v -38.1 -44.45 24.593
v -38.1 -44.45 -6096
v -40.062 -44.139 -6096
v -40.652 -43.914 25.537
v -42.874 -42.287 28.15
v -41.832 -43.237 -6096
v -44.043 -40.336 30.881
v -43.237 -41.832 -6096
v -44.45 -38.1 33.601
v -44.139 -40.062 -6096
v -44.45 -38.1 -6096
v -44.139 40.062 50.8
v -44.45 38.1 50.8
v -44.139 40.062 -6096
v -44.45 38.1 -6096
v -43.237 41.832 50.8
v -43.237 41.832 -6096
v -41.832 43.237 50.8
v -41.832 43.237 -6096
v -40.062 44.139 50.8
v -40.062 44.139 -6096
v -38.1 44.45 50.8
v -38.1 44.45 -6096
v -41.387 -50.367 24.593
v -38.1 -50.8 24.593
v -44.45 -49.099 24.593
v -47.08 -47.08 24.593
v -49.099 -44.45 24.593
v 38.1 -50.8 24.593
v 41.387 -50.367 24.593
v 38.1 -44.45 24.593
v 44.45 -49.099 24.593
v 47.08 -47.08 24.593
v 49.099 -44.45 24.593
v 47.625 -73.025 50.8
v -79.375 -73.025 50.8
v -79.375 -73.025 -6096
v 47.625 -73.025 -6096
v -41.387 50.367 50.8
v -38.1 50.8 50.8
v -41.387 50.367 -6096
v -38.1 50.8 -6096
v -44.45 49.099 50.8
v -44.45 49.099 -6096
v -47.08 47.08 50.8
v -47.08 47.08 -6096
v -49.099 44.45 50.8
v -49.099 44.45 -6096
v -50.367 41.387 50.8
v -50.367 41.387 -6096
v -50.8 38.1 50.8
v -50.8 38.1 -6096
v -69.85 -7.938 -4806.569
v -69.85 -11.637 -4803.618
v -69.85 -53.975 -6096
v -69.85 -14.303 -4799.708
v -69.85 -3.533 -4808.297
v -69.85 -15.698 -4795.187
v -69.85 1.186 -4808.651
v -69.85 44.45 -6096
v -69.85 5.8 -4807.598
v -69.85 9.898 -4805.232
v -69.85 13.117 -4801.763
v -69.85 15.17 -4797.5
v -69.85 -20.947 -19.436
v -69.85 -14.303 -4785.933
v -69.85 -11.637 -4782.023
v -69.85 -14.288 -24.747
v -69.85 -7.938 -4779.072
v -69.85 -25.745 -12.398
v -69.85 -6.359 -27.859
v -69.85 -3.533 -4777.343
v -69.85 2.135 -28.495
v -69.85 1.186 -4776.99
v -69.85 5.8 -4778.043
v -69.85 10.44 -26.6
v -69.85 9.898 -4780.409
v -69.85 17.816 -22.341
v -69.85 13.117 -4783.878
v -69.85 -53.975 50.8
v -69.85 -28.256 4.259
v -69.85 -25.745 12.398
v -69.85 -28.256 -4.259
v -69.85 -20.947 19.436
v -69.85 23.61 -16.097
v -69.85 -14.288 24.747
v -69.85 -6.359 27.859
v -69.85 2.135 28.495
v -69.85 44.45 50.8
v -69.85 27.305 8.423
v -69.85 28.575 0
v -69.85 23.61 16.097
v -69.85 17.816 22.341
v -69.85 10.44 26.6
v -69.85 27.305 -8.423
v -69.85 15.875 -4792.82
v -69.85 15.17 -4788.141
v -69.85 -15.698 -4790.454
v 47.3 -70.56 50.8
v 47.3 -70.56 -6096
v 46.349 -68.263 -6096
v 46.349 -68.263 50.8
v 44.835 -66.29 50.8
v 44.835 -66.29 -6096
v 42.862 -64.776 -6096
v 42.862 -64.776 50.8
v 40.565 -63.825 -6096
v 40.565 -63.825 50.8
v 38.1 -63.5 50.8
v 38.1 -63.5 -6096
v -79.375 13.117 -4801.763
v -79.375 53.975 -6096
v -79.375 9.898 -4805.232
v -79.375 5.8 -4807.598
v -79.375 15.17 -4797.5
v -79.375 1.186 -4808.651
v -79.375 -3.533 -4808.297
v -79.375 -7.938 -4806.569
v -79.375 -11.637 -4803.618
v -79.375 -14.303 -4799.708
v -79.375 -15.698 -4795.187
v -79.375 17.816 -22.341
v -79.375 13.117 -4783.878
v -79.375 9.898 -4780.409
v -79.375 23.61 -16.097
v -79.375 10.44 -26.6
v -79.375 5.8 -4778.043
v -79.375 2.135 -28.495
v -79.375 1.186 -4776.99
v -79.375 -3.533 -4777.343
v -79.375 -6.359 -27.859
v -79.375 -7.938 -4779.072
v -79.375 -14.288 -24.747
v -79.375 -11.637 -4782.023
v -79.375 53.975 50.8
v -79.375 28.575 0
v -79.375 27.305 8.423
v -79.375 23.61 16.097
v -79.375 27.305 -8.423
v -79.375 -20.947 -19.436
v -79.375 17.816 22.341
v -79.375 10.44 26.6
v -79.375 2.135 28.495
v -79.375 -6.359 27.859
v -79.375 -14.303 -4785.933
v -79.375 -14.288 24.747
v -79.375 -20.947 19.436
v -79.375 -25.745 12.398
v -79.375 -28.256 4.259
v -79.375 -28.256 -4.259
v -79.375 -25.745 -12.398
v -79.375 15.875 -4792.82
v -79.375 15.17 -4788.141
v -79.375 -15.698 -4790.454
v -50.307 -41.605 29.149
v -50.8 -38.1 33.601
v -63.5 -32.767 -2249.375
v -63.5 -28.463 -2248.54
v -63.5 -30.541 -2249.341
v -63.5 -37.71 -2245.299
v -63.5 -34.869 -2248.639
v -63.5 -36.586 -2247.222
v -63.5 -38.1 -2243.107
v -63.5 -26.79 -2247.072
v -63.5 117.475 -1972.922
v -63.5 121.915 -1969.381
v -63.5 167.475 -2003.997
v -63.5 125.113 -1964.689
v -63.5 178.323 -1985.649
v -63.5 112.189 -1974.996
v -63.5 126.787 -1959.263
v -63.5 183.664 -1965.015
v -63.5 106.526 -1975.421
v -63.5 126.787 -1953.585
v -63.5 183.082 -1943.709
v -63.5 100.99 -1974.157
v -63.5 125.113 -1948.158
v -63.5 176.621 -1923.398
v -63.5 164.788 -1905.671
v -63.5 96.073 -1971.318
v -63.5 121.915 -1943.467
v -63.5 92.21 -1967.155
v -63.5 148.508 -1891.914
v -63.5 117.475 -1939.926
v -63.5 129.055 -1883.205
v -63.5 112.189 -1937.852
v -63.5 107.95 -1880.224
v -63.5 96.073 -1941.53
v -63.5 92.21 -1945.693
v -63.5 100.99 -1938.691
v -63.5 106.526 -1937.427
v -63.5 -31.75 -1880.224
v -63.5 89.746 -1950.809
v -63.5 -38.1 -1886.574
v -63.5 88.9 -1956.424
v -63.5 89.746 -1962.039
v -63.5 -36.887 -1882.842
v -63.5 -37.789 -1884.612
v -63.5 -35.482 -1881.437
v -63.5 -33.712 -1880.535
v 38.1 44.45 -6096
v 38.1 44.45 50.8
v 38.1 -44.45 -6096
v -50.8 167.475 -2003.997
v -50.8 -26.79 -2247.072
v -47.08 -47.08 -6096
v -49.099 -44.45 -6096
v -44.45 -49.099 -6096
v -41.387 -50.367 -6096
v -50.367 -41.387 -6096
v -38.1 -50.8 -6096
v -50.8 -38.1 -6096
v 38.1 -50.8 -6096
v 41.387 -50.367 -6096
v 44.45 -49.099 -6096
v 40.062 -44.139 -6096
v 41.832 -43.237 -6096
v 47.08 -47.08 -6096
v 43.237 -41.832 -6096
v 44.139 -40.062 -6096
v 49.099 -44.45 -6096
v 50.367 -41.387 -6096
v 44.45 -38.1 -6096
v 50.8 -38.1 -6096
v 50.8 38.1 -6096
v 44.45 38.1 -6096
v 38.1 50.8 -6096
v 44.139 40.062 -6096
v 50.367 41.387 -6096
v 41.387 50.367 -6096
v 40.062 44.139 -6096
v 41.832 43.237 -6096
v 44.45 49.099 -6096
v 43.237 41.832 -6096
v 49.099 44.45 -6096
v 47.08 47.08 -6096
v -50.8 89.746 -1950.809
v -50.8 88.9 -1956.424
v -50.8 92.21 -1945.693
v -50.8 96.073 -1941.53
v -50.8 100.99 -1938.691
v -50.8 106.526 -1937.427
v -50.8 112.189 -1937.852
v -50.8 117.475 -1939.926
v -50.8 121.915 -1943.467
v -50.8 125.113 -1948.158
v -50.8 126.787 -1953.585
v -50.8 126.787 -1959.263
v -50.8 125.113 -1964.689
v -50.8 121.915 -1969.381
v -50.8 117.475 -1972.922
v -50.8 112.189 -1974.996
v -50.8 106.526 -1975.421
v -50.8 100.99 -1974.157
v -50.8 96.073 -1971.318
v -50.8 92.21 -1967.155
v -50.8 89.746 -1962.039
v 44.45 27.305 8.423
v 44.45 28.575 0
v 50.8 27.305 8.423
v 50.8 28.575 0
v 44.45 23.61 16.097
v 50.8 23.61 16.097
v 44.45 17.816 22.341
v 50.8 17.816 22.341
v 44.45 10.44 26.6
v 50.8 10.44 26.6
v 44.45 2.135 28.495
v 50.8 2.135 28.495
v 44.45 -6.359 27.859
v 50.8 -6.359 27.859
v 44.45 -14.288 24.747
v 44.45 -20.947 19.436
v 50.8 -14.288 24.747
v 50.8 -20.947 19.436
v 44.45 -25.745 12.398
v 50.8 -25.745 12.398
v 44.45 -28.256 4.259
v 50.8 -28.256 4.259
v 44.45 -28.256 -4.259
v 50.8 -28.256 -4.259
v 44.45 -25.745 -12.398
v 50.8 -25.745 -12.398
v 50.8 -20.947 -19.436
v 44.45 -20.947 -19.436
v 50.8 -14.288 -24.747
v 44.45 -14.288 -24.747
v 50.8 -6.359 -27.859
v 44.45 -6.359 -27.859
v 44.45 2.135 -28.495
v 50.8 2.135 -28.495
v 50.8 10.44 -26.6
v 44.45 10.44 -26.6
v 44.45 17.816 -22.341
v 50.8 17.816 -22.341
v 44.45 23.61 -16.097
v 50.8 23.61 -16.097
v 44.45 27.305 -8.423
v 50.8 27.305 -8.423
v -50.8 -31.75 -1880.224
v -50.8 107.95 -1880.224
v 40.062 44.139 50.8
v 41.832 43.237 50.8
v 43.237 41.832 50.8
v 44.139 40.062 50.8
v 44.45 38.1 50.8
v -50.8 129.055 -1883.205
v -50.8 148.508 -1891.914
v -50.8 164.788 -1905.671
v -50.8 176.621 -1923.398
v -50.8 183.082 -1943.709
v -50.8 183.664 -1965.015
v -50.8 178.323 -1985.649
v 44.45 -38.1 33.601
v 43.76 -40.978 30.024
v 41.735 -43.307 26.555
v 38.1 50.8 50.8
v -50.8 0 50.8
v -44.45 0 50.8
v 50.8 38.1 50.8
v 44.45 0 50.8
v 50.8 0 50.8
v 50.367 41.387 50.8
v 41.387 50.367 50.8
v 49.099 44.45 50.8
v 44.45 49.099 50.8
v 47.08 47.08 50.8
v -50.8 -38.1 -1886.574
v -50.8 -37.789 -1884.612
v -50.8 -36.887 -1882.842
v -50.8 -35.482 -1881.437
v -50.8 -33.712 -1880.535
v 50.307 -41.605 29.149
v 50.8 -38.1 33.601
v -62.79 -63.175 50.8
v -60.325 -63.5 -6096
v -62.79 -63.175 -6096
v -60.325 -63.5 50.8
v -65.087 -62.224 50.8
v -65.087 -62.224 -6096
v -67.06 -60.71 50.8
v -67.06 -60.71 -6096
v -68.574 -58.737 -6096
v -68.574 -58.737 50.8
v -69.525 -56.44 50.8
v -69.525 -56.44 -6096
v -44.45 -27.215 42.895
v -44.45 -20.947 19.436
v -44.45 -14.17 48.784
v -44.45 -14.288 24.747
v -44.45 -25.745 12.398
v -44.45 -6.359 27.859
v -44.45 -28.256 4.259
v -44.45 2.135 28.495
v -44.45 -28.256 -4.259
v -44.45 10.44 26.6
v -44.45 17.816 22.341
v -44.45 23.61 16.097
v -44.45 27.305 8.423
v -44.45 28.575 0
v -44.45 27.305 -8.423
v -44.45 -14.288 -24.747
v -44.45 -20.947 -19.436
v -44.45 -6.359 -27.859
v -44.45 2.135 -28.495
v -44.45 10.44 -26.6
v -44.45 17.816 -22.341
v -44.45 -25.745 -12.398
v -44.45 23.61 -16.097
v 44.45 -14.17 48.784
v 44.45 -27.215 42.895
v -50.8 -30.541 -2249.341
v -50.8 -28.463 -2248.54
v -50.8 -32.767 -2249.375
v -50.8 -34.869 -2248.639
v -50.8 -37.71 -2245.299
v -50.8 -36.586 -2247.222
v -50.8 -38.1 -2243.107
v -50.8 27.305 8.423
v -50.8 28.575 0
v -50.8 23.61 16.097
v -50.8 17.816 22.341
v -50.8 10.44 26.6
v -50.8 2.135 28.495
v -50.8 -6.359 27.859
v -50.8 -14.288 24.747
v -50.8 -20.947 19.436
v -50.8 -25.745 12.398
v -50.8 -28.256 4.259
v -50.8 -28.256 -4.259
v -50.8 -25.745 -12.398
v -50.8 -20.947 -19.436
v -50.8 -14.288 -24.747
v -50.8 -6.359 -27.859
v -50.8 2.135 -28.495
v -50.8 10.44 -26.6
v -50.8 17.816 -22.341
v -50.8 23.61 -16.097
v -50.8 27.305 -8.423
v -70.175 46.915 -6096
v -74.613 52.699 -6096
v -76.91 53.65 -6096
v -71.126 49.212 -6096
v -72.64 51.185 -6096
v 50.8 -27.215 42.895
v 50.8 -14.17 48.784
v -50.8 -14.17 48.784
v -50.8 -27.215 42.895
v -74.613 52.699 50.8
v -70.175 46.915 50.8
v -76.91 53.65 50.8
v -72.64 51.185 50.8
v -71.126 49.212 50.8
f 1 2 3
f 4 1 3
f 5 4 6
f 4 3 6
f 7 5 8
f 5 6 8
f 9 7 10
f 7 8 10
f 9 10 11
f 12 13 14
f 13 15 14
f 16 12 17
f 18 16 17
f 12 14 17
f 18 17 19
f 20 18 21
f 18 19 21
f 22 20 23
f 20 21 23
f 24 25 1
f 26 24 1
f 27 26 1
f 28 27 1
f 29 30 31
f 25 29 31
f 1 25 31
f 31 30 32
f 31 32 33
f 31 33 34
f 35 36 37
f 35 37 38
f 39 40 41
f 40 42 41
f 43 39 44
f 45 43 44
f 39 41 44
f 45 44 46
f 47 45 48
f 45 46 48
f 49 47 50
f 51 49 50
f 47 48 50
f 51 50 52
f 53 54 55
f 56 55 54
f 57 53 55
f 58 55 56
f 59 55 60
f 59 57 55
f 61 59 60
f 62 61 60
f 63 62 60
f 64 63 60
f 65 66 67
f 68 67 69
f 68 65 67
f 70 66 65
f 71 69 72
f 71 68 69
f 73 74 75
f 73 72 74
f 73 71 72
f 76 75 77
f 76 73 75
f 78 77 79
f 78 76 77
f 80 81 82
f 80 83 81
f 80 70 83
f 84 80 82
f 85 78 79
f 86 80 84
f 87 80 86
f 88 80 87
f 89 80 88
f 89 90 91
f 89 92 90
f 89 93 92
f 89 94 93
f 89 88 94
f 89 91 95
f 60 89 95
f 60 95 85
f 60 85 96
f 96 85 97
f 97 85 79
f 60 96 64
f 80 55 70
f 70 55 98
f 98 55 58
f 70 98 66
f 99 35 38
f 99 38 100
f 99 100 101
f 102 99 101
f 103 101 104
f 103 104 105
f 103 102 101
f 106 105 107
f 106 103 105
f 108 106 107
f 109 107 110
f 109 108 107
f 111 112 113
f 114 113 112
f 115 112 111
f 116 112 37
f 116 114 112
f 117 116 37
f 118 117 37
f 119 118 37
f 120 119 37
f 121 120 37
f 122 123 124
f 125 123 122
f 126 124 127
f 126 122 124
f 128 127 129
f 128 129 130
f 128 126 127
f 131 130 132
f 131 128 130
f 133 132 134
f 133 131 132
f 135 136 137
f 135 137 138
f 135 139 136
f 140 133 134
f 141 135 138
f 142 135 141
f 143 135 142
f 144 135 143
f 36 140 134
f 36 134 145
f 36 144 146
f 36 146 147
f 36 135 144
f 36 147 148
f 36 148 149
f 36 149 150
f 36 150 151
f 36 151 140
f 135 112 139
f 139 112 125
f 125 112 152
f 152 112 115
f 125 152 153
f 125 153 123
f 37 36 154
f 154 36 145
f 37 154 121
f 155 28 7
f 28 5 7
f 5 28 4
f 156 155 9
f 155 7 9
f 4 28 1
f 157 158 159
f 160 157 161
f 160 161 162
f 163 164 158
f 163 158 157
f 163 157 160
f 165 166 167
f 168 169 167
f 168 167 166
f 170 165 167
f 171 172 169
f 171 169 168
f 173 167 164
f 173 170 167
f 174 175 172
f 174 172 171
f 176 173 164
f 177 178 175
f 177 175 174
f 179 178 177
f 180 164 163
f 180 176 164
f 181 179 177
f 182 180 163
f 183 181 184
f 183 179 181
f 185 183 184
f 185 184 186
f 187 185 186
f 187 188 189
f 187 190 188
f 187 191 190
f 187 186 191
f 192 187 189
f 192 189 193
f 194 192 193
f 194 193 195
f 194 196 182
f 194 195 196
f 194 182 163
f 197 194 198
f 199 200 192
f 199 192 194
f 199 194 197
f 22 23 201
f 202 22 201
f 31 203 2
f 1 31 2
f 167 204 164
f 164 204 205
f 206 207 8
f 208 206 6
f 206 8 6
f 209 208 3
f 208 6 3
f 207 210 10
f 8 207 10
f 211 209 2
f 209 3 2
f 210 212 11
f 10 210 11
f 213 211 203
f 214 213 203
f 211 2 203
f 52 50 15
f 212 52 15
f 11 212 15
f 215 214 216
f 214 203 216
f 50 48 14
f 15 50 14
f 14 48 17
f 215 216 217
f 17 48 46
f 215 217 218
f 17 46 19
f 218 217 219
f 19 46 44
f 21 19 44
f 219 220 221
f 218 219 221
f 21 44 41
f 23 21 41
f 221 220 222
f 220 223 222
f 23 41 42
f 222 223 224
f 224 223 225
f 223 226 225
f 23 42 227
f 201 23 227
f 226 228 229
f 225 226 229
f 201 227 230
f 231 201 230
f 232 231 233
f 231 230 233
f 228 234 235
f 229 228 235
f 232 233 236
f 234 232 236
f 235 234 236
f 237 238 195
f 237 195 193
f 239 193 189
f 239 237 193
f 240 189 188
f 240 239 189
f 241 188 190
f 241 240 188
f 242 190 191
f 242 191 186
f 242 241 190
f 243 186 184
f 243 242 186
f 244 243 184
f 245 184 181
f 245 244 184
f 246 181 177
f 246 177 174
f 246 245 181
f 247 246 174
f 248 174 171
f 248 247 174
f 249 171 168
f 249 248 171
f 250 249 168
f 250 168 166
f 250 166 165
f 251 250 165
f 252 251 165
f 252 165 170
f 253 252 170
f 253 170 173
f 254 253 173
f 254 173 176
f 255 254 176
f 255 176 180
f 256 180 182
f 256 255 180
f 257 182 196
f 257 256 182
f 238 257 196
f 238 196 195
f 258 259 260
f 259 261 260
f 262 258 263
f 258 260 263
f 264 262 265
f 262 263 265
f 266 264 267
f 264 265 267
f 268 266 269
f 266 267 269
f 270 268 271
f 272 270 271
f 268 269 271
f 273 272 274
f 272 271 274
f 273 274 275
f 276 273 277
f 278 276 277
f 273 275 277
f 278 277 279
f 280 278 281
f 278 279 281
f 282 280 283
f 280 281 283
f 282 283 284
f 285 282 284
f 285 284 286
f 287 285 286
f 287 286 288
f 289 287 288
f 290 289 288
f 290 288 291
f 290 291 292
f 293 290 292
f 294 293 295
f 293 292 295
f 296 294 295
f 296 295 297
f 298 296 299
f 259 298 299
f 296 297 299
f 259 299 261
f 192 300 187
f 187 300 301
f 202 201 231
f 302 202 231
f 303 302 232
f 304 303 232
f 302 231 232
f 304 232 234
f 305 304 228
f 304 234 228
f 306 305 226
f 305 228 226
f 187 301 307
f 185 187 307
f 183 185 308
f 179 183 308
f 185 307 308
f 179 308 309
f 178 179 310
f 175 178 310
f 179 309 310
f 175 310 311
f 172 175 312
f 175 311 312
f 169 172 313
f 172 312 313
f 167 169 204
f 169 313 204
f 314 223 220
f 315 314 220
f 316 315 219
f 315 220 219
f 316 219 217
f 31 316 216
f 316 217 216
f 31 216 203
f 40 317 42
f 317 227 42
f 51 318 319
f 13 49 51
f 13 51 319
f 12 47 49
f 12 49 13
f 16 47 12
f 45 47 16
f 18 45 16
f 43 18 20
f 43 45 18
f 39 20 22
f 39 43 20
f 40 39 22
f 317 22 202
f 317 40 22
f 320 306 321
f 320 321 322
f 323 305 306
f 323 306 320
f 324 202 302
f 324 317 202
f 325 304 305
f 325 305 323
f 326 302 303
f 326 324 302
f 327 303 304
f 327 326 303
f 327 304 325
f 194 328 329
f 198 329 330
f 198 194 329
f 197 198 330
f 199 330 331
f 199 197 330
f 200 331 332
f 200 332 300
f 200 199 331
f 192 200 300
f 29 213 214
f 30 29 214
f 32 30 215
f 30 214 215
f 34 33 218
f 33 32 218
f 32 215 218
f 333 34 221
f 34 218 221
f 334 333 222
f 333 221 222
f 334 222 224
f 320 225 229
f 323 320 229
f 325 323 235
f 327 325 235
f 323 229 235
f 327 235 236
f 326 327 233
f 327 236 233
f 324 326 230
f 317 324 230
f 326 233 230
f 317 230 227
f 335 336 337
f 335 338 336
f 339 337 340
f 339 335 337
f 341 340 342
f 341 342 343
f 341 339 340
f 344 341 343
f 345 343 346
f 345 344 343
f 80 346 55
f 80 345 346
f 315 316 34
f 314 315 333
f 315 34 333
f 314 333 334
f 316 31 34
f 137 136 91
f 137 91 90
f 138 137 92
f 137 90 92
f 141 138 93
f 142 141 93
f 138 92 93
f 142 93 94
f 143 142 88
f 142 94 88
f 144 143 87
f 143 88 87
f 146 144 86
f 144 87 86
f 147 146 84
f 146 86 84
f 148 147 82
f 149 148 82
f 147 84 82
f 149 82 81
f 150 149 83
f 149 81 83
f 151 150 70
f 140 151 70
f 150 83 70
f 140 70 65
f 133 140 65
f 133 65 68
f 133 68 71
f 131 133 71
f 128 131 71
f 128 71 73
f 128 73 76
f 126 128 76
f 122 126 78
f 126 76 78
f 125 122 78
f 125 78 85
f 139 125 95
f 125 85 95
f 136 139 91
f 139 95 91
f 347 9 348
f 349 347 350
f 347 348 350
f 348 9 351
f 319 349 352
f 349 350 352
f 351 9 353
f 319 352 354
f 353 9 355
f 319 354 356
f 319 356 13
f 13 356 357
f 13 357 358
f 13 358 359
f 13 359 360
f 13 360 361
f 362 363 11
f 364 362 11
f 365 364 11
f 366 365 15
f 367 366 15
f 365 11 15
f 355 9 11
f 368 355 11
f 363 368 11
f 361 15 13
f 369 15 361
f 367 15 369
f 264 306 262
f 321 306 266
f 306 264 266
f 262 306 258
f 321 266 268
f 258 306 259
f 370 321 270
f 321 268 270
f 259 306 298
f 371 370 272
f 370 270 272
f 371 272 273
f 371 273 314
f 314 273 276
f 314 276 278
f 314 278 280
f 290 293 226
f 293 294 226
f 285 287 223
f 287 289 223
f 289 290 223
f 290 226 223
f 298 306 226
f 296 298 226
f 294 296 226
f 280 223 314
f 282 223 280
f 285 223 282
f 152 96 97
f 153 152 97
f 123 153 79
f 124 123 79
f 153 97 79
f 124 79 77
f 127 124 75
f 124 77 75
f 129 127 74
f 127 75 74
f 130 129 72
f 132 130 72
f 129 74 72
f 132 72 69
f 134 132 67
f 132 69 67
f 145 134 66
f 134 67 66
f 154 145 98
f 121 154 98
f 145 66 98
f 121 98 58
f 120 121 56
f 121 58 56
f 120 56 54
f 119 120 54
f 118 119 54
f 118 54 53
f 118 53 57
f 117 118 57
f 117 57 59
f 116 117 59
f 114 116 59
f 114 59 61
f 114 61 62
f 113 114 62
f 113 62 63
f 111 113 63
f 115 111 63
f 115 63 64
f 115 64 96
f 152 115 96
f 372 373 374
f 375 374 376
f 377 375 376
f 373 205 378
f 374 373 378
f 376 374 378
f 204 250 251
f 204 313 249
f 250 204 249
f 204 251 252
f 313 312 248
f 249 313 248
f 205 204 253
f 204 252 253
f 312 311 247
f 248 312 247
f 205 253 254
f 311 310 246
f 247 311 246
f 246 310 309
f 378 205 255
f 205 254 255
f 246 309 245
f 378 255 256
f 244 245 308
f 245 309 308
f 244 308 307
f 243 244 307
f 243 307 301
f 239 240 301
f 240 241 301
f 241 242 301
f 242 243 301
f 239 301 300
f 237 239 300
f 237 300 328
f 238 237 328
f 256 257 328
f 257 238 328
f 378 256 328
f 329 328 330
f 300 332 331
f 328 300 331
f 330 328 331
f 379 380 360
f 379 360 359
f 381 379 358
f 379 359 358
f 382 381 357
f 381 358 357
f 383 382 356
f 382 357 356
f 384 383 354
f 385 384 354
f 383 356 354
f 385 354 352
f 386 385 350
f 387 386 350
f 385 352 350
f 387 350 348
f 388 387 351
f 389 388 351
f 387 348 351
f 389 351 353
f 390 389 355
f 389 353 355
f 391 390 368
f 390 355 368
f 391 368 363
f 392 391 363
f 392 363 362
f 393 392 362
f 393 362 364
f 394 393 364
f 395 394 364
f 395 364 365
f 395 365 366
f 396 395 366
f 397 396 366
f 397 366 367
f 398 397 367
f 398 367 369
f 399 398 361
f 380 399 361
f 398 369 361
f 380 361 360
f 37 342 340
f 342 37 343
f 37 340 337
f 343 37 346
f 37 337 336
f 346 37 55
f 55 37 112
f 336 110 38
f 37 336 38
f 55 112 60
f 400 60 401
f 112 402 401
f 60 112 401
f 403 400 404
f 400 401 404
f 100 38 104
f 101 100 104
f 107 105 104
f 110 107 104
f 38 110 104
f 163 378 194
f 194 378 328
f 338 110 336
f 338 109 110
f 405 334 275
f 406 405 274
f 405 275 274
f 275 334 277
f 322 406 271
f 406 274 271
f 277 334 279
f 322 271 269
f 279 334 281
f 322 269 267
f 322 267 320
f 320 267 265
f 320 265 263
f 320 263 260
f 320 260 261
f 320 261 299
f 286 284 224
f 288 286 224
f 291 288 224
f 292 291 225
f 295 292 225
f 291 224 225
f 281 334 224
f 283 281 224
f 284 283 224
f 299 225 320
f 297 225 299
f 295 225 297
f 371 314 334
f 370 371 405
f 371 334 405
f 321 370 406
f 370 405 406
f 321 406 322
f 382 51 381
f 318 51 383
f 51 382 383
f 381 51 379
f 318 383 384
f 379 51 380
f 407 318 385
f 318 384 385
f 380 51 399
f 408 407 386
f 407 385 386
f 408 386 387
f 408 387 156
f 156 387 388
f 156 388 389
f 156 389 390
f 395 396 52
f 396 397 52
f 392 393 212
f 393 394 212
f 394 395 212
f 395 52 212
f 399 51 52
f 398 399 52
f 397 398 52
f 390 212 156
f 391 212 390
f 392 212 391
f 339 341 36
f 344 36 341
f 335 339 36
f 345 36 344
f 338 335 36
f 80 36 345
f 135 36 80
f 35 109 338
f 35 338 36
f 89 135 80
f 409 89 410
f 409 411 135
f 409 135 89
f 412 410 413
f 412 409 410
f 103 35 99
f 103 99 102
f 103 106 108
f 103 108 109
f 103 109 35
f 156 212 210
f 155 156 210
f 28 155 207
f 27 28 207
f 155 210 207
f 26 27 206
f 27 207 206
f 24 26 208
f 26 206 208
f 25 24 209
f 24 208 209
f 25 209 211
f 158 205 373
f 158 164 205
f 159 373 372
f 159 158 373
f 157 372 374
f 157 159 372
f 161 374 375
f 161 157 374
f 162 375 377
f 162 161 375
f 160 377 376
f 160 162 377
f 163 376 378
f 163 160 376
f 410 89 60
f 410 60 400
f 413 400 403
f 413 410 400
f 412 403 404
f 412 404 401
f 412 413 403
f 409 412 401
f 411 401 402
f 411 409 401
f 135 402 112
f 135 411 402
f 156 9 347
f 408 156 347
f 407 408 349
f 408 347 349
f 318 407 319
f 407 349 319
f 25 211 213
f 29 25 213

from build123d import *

# Parameters (mm, degrees)
F1_DEPTH      = 6096
F1_DEPTH_BACK = 50.8
F2_DEPTH      = 50.8
F2_DEPTH_BACK = 6096
F3_R          = 15.875
F4_DEPTH      = 9.526
F3_R_2        = 28.575
F3_R_3        = 19.05
F5_DEPTH      = 120.651
F5_DEPTH_BACK = 9.526
F7_R          = 19.05
F8_DEPTH      = 12.7
F9_R          = 6.35
F11_DEPTH     = 130.176


# Not quite as in the source:
# - the program builds the solid bodies; features that only make, move or delete a surface that nothing else refers to are left out


with BuildPart() as f1:
    # F12 (on Top) → F1 (new body, two sides)
    with BuildSketch(Plane.XY) as f1_sk:
        with BuildLine():
            ThreePointArc((50.8, 38.1), (47.0802561211, 47.0802561211), (38.1, 50.8))
            Line((38.1, 50.8), (-38.1, 50.8))
            ThreePointArc((-38.1, 50.8), (-47.0802561211, 47.0802561211), (-50.8, 38.1))
            Line((-50.8, 38.1), (-50.8, -38.1))
            ThreePointArc((-50.8, -38.1), (-47.0802561211, -47.0802561211), (-38.1, -50.8))
            Line((-38.1, -50.8), (38.1, -50.8))
            ThreePointArc((38.1, -50.8), (47.0802561211, -47.0802561211), (50.8, -38.1))
            Line((50.8, -38.1), (50.8, 38.1))
        make_face()
        with BuildLine():
            ThreePointArc((-44.45, 38.1), (-42.5901280605, 42.5901280605), (-38.1, 44.45))
            Line((-38.1, 44.45), (38.1, 44.45))
            ThreePointArc((38.1, 44.45), (42.5901280605, 42.5901280605), (44.45, 38.1))
            Line((44.45, 38.1), (44.45, -38.1))
            ThreePointArc((44.45, -38.1), (42.5901280605, -42.5901280605), (38.1, -44.45))
            Line((38.1, -44.45), (-38.1, -44.45))
            ThreePointArc((-38.1, -44.45), (-42.5901280605, -42.5901280605), (-44.45, -38.1))
            Line((-44.45, -38.1), (-44.45, 38.1))
        make_face(mode=Mode.SUBTRACT)
    extrude(amount=-F1_DEPTH)
    extrude(f1_sk.sketch, amount=F1_DEPTH_BACK)


with BuildPart() as f2:
    # F12 (on Top) → F2 (new body, two sides)
    with BuildSketch(Plane.XY) as f2_sk:
        with BuildLine():
            Line((-69.85, -53.975), (-69.85, 44.45))
            ThreePointArc((-69.85, 44.45), (-72.6398079092, 51.1851920908), (-79.375, 53.975))
            Line((-79.375, 53.975), (-79.375, -73.025))
            Line((-79.375, -73.025), (47.625, -73.025))
            ThreePointArc((47.625, -73.025), (44.8351920908, -66.2898079092), (38.1, -63.5))
            Line((38.1, -63.5), (-60.325, -63.5))
            ThreePointArc((-60.325, -63.5), (-67.0601920908, -60.7101920908), (-69.85, -53.975))
        make_face()
    extrude(amount=F2_DEPTH)
    extrude(f2_sk.sketch, amount=-F2_DEPTH_BACK)

    # F3 (on face) → F4 (cut, through all)
    with BuildSketch(Plane.YZ.offset(-69.85)):
        with Locations((0, -4792.820472761)):
            Circle(F3_R)
    extrude(amount=-F4_DEPTH, mode=Mode.SUBTRACT)


with BuildPart() as f5_tool:
    # F3 (on face) → F5 (new body, two sides)
    with BuildSketch(Plane.YZ.offset(-69.85)) as f5_sk:
        Circle(F3_R_2)
        Circle(F3_R_3, mode=Mode.SUBTRACT)
        Circle(F3_R_3)
    extrude(amount=F5_DEPTH)
    extrude(f5_sk.sketch, amount=-F5_DEPTH_BACK)


with BuildPart() as f1_1:
    add(f1.part)

    # F5: cut by f5_tool
    add(f5_tool.part, mode=Mode.SUBTRACT)

    # F10 (on face) → F11 (cut, through all)
    with BuildSketch(Plane.YZ.offset(50.8)):
        with BuildLine():
            Line((-38.1, 50.8), (-38.1, 33.6010416505))
            ThreePointArc((-38.1, 33.6010416505), (-20.9010416505, 46.3010416505), (0, 50.8))
            Line((0, 50.8), (-38.1, 50.8))
        make_face()
        with BuildLine():
            Line((-50.8, 24.5934442484), (-44.45, 24.5934442484))
            ThreePointArc((-44.45, 24.5934442484), (-41.5199931086, 29.2699534038), (-38.1, 33.6010416505))
            Line((-38.1, 33.6010416505), (-38.1, 50.8))
            Line((-38.1, 50.8), (-50.8, 50.8))
            Line((-50.8, 50.8), (-50.8, 24.5934442484))
        make_face()
    extrude(amount=-F11_DEPTH, mode=Mode.SUBTRACT)


with BuildPart() as f2_1:
    add(f2.part)

    # F5: cut by f5_tool
    add(f5_tool.part, mode=Mode.SUBTRACT)


with BuildPart() as f8:
    # F7 (on face) → F8 (new body)
    with BuildSketch(Plane(origin=(-50.8, 0, 0), x_dir=(0, -1, 0), z_dir=(-1, 0, 0))):
        with BuildLine():
            Line((-38.1, -2165.878324814), (-38.1, -1880.2239560519))
            Line((-38.1, -1880.2239560519), (-107.95, -1880.2239560519))
            ThreePointArc((-107.95, -1880.2239560519), (-176.6212263011, -1923.3981679718), (-167.4754951972, -2003.9965891672))
            Line((-167.4754951972, -2003.9965891672), (-38.1, -2165.878324814))
        make_face()
        with Locations((-107.95, -1956.4239560519)):
            Circle(F7_R, mode=Mode.SUBTRACT)
        Polygon((38.1, -2261.2239560519), (38.1, -1880.2239560519), (-38.1, -1880.2239560519), (-38.1, -2165.878324814), align=None)
    extrude(amount=F8_DEPTH)

    # F9
    f9_edges = [f8.edges().sort_by_distance(p)[0] for p in [
        (-57.15, -38.1, -1880.223956),
        (-57.15, -38.1, -2261.223956),
    ]]
    fillet(f9_edges, radius=F9_R)


solid = Compound([f1_1.part, f2_1.part, f8.part])
